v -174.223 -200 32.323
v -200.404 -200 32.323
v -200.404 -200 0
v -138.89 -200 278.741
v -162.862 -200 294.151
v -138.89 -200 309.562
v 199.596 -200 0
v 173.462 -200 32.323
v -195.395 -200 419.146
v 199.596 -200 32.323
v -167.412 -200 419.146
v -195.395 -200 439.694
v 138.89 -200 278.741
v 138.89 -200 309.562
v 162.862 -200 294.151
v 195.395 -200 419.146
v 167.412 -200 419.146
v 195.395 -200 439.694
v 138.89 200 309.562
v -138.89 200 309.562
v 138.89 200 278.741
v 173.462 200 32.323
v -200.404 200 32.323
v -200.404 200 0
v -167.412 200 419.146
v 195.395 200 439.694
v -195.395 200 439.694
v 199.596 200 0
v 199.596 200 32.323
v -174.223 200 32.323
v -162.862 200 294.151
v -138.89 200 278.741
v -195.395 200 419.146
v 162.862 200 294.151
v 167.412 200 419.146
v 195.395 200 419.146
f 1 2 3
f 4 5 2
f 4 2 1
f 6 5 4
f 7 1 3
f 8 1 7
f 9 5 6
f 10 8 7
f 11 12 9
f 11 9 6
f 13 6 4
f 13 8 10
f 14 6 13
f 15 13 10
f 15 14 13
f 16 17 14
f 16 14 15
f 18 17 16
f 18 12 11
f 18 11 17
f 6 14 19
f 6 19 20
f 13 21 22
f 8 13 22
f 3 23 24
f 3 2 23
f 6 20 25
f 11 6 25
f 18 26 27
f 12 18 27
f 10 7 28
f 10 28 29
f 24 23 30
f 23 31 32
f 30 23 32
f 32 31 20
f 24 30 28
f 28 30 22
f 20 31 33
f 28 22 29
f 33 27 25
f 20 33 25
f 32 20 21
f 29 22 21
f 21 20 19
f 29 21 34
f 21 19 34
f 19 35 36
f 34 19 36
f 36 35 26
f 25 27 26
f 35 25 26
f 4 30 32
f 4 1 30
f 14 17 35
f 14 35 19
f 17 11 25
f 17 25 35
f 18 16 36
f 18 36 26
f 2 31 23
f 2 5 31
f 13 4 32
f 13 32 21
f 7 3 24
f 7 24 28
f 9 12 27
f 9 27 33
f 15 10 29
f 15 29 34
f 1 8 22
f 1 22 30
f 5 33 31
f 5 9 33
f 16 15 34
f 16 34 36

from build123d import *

# Parameters (mm, degrees)
F1_DEPTH = 200
F2_DEPTH = 200


with BuildPart() as f1:
    # F0 (on Front) → F1 (new body)
    with BuildSketch(Plane.XZ):
        Polygon((-200.404041155, 32.3232361522), (-200.404041155, 0), (0, 0), (0, 32.3232361522), (-174.2227269083, 32.3232361522), (-138.8900934788, 278.7407568237), (0, 278.7407568237), (0, 309.5615165938), (-138.8900934788, 309.5615165938), (-167.4122055572, 419.1463837006), (0, 419.1463837006), (0, 439.6935438375), (-195.3948229849, 439.6935438375), (-195.3948229849, 419.1463837006), (-162.8617868268, 294.1511367087), align=None)
        Polygon((0, 32.3232361522), (0, 0), (199.595958845, 0), (199.595958845, 32.3232361522), (162.8617868268, 294.1511367087), (195.3948229849, 419.1463837006), (195.3948229849, 439.6935438375), (0, 439.6935438375), (0, 419.1463837006), (167.4122055572, 419.1463837006), (138.8900934788, 309.5615165938), (0, 309.5615165938), (0, 278.7407568237), (138.8900934788, 278.7407568237), (173.4622058221, 32.3232361522), align=None)
    extrude(amount=F1_DEPTH)

    # F2 (add): a face of the model
    f2_faces = [f1.faces().sort_by_distance(p)[0] for p in [
        (-194.4598808906, 0, 16.1616180761),
    ]]
    extrude(f2_faces, amount=F2_DEPTH)


solid = f1.part
